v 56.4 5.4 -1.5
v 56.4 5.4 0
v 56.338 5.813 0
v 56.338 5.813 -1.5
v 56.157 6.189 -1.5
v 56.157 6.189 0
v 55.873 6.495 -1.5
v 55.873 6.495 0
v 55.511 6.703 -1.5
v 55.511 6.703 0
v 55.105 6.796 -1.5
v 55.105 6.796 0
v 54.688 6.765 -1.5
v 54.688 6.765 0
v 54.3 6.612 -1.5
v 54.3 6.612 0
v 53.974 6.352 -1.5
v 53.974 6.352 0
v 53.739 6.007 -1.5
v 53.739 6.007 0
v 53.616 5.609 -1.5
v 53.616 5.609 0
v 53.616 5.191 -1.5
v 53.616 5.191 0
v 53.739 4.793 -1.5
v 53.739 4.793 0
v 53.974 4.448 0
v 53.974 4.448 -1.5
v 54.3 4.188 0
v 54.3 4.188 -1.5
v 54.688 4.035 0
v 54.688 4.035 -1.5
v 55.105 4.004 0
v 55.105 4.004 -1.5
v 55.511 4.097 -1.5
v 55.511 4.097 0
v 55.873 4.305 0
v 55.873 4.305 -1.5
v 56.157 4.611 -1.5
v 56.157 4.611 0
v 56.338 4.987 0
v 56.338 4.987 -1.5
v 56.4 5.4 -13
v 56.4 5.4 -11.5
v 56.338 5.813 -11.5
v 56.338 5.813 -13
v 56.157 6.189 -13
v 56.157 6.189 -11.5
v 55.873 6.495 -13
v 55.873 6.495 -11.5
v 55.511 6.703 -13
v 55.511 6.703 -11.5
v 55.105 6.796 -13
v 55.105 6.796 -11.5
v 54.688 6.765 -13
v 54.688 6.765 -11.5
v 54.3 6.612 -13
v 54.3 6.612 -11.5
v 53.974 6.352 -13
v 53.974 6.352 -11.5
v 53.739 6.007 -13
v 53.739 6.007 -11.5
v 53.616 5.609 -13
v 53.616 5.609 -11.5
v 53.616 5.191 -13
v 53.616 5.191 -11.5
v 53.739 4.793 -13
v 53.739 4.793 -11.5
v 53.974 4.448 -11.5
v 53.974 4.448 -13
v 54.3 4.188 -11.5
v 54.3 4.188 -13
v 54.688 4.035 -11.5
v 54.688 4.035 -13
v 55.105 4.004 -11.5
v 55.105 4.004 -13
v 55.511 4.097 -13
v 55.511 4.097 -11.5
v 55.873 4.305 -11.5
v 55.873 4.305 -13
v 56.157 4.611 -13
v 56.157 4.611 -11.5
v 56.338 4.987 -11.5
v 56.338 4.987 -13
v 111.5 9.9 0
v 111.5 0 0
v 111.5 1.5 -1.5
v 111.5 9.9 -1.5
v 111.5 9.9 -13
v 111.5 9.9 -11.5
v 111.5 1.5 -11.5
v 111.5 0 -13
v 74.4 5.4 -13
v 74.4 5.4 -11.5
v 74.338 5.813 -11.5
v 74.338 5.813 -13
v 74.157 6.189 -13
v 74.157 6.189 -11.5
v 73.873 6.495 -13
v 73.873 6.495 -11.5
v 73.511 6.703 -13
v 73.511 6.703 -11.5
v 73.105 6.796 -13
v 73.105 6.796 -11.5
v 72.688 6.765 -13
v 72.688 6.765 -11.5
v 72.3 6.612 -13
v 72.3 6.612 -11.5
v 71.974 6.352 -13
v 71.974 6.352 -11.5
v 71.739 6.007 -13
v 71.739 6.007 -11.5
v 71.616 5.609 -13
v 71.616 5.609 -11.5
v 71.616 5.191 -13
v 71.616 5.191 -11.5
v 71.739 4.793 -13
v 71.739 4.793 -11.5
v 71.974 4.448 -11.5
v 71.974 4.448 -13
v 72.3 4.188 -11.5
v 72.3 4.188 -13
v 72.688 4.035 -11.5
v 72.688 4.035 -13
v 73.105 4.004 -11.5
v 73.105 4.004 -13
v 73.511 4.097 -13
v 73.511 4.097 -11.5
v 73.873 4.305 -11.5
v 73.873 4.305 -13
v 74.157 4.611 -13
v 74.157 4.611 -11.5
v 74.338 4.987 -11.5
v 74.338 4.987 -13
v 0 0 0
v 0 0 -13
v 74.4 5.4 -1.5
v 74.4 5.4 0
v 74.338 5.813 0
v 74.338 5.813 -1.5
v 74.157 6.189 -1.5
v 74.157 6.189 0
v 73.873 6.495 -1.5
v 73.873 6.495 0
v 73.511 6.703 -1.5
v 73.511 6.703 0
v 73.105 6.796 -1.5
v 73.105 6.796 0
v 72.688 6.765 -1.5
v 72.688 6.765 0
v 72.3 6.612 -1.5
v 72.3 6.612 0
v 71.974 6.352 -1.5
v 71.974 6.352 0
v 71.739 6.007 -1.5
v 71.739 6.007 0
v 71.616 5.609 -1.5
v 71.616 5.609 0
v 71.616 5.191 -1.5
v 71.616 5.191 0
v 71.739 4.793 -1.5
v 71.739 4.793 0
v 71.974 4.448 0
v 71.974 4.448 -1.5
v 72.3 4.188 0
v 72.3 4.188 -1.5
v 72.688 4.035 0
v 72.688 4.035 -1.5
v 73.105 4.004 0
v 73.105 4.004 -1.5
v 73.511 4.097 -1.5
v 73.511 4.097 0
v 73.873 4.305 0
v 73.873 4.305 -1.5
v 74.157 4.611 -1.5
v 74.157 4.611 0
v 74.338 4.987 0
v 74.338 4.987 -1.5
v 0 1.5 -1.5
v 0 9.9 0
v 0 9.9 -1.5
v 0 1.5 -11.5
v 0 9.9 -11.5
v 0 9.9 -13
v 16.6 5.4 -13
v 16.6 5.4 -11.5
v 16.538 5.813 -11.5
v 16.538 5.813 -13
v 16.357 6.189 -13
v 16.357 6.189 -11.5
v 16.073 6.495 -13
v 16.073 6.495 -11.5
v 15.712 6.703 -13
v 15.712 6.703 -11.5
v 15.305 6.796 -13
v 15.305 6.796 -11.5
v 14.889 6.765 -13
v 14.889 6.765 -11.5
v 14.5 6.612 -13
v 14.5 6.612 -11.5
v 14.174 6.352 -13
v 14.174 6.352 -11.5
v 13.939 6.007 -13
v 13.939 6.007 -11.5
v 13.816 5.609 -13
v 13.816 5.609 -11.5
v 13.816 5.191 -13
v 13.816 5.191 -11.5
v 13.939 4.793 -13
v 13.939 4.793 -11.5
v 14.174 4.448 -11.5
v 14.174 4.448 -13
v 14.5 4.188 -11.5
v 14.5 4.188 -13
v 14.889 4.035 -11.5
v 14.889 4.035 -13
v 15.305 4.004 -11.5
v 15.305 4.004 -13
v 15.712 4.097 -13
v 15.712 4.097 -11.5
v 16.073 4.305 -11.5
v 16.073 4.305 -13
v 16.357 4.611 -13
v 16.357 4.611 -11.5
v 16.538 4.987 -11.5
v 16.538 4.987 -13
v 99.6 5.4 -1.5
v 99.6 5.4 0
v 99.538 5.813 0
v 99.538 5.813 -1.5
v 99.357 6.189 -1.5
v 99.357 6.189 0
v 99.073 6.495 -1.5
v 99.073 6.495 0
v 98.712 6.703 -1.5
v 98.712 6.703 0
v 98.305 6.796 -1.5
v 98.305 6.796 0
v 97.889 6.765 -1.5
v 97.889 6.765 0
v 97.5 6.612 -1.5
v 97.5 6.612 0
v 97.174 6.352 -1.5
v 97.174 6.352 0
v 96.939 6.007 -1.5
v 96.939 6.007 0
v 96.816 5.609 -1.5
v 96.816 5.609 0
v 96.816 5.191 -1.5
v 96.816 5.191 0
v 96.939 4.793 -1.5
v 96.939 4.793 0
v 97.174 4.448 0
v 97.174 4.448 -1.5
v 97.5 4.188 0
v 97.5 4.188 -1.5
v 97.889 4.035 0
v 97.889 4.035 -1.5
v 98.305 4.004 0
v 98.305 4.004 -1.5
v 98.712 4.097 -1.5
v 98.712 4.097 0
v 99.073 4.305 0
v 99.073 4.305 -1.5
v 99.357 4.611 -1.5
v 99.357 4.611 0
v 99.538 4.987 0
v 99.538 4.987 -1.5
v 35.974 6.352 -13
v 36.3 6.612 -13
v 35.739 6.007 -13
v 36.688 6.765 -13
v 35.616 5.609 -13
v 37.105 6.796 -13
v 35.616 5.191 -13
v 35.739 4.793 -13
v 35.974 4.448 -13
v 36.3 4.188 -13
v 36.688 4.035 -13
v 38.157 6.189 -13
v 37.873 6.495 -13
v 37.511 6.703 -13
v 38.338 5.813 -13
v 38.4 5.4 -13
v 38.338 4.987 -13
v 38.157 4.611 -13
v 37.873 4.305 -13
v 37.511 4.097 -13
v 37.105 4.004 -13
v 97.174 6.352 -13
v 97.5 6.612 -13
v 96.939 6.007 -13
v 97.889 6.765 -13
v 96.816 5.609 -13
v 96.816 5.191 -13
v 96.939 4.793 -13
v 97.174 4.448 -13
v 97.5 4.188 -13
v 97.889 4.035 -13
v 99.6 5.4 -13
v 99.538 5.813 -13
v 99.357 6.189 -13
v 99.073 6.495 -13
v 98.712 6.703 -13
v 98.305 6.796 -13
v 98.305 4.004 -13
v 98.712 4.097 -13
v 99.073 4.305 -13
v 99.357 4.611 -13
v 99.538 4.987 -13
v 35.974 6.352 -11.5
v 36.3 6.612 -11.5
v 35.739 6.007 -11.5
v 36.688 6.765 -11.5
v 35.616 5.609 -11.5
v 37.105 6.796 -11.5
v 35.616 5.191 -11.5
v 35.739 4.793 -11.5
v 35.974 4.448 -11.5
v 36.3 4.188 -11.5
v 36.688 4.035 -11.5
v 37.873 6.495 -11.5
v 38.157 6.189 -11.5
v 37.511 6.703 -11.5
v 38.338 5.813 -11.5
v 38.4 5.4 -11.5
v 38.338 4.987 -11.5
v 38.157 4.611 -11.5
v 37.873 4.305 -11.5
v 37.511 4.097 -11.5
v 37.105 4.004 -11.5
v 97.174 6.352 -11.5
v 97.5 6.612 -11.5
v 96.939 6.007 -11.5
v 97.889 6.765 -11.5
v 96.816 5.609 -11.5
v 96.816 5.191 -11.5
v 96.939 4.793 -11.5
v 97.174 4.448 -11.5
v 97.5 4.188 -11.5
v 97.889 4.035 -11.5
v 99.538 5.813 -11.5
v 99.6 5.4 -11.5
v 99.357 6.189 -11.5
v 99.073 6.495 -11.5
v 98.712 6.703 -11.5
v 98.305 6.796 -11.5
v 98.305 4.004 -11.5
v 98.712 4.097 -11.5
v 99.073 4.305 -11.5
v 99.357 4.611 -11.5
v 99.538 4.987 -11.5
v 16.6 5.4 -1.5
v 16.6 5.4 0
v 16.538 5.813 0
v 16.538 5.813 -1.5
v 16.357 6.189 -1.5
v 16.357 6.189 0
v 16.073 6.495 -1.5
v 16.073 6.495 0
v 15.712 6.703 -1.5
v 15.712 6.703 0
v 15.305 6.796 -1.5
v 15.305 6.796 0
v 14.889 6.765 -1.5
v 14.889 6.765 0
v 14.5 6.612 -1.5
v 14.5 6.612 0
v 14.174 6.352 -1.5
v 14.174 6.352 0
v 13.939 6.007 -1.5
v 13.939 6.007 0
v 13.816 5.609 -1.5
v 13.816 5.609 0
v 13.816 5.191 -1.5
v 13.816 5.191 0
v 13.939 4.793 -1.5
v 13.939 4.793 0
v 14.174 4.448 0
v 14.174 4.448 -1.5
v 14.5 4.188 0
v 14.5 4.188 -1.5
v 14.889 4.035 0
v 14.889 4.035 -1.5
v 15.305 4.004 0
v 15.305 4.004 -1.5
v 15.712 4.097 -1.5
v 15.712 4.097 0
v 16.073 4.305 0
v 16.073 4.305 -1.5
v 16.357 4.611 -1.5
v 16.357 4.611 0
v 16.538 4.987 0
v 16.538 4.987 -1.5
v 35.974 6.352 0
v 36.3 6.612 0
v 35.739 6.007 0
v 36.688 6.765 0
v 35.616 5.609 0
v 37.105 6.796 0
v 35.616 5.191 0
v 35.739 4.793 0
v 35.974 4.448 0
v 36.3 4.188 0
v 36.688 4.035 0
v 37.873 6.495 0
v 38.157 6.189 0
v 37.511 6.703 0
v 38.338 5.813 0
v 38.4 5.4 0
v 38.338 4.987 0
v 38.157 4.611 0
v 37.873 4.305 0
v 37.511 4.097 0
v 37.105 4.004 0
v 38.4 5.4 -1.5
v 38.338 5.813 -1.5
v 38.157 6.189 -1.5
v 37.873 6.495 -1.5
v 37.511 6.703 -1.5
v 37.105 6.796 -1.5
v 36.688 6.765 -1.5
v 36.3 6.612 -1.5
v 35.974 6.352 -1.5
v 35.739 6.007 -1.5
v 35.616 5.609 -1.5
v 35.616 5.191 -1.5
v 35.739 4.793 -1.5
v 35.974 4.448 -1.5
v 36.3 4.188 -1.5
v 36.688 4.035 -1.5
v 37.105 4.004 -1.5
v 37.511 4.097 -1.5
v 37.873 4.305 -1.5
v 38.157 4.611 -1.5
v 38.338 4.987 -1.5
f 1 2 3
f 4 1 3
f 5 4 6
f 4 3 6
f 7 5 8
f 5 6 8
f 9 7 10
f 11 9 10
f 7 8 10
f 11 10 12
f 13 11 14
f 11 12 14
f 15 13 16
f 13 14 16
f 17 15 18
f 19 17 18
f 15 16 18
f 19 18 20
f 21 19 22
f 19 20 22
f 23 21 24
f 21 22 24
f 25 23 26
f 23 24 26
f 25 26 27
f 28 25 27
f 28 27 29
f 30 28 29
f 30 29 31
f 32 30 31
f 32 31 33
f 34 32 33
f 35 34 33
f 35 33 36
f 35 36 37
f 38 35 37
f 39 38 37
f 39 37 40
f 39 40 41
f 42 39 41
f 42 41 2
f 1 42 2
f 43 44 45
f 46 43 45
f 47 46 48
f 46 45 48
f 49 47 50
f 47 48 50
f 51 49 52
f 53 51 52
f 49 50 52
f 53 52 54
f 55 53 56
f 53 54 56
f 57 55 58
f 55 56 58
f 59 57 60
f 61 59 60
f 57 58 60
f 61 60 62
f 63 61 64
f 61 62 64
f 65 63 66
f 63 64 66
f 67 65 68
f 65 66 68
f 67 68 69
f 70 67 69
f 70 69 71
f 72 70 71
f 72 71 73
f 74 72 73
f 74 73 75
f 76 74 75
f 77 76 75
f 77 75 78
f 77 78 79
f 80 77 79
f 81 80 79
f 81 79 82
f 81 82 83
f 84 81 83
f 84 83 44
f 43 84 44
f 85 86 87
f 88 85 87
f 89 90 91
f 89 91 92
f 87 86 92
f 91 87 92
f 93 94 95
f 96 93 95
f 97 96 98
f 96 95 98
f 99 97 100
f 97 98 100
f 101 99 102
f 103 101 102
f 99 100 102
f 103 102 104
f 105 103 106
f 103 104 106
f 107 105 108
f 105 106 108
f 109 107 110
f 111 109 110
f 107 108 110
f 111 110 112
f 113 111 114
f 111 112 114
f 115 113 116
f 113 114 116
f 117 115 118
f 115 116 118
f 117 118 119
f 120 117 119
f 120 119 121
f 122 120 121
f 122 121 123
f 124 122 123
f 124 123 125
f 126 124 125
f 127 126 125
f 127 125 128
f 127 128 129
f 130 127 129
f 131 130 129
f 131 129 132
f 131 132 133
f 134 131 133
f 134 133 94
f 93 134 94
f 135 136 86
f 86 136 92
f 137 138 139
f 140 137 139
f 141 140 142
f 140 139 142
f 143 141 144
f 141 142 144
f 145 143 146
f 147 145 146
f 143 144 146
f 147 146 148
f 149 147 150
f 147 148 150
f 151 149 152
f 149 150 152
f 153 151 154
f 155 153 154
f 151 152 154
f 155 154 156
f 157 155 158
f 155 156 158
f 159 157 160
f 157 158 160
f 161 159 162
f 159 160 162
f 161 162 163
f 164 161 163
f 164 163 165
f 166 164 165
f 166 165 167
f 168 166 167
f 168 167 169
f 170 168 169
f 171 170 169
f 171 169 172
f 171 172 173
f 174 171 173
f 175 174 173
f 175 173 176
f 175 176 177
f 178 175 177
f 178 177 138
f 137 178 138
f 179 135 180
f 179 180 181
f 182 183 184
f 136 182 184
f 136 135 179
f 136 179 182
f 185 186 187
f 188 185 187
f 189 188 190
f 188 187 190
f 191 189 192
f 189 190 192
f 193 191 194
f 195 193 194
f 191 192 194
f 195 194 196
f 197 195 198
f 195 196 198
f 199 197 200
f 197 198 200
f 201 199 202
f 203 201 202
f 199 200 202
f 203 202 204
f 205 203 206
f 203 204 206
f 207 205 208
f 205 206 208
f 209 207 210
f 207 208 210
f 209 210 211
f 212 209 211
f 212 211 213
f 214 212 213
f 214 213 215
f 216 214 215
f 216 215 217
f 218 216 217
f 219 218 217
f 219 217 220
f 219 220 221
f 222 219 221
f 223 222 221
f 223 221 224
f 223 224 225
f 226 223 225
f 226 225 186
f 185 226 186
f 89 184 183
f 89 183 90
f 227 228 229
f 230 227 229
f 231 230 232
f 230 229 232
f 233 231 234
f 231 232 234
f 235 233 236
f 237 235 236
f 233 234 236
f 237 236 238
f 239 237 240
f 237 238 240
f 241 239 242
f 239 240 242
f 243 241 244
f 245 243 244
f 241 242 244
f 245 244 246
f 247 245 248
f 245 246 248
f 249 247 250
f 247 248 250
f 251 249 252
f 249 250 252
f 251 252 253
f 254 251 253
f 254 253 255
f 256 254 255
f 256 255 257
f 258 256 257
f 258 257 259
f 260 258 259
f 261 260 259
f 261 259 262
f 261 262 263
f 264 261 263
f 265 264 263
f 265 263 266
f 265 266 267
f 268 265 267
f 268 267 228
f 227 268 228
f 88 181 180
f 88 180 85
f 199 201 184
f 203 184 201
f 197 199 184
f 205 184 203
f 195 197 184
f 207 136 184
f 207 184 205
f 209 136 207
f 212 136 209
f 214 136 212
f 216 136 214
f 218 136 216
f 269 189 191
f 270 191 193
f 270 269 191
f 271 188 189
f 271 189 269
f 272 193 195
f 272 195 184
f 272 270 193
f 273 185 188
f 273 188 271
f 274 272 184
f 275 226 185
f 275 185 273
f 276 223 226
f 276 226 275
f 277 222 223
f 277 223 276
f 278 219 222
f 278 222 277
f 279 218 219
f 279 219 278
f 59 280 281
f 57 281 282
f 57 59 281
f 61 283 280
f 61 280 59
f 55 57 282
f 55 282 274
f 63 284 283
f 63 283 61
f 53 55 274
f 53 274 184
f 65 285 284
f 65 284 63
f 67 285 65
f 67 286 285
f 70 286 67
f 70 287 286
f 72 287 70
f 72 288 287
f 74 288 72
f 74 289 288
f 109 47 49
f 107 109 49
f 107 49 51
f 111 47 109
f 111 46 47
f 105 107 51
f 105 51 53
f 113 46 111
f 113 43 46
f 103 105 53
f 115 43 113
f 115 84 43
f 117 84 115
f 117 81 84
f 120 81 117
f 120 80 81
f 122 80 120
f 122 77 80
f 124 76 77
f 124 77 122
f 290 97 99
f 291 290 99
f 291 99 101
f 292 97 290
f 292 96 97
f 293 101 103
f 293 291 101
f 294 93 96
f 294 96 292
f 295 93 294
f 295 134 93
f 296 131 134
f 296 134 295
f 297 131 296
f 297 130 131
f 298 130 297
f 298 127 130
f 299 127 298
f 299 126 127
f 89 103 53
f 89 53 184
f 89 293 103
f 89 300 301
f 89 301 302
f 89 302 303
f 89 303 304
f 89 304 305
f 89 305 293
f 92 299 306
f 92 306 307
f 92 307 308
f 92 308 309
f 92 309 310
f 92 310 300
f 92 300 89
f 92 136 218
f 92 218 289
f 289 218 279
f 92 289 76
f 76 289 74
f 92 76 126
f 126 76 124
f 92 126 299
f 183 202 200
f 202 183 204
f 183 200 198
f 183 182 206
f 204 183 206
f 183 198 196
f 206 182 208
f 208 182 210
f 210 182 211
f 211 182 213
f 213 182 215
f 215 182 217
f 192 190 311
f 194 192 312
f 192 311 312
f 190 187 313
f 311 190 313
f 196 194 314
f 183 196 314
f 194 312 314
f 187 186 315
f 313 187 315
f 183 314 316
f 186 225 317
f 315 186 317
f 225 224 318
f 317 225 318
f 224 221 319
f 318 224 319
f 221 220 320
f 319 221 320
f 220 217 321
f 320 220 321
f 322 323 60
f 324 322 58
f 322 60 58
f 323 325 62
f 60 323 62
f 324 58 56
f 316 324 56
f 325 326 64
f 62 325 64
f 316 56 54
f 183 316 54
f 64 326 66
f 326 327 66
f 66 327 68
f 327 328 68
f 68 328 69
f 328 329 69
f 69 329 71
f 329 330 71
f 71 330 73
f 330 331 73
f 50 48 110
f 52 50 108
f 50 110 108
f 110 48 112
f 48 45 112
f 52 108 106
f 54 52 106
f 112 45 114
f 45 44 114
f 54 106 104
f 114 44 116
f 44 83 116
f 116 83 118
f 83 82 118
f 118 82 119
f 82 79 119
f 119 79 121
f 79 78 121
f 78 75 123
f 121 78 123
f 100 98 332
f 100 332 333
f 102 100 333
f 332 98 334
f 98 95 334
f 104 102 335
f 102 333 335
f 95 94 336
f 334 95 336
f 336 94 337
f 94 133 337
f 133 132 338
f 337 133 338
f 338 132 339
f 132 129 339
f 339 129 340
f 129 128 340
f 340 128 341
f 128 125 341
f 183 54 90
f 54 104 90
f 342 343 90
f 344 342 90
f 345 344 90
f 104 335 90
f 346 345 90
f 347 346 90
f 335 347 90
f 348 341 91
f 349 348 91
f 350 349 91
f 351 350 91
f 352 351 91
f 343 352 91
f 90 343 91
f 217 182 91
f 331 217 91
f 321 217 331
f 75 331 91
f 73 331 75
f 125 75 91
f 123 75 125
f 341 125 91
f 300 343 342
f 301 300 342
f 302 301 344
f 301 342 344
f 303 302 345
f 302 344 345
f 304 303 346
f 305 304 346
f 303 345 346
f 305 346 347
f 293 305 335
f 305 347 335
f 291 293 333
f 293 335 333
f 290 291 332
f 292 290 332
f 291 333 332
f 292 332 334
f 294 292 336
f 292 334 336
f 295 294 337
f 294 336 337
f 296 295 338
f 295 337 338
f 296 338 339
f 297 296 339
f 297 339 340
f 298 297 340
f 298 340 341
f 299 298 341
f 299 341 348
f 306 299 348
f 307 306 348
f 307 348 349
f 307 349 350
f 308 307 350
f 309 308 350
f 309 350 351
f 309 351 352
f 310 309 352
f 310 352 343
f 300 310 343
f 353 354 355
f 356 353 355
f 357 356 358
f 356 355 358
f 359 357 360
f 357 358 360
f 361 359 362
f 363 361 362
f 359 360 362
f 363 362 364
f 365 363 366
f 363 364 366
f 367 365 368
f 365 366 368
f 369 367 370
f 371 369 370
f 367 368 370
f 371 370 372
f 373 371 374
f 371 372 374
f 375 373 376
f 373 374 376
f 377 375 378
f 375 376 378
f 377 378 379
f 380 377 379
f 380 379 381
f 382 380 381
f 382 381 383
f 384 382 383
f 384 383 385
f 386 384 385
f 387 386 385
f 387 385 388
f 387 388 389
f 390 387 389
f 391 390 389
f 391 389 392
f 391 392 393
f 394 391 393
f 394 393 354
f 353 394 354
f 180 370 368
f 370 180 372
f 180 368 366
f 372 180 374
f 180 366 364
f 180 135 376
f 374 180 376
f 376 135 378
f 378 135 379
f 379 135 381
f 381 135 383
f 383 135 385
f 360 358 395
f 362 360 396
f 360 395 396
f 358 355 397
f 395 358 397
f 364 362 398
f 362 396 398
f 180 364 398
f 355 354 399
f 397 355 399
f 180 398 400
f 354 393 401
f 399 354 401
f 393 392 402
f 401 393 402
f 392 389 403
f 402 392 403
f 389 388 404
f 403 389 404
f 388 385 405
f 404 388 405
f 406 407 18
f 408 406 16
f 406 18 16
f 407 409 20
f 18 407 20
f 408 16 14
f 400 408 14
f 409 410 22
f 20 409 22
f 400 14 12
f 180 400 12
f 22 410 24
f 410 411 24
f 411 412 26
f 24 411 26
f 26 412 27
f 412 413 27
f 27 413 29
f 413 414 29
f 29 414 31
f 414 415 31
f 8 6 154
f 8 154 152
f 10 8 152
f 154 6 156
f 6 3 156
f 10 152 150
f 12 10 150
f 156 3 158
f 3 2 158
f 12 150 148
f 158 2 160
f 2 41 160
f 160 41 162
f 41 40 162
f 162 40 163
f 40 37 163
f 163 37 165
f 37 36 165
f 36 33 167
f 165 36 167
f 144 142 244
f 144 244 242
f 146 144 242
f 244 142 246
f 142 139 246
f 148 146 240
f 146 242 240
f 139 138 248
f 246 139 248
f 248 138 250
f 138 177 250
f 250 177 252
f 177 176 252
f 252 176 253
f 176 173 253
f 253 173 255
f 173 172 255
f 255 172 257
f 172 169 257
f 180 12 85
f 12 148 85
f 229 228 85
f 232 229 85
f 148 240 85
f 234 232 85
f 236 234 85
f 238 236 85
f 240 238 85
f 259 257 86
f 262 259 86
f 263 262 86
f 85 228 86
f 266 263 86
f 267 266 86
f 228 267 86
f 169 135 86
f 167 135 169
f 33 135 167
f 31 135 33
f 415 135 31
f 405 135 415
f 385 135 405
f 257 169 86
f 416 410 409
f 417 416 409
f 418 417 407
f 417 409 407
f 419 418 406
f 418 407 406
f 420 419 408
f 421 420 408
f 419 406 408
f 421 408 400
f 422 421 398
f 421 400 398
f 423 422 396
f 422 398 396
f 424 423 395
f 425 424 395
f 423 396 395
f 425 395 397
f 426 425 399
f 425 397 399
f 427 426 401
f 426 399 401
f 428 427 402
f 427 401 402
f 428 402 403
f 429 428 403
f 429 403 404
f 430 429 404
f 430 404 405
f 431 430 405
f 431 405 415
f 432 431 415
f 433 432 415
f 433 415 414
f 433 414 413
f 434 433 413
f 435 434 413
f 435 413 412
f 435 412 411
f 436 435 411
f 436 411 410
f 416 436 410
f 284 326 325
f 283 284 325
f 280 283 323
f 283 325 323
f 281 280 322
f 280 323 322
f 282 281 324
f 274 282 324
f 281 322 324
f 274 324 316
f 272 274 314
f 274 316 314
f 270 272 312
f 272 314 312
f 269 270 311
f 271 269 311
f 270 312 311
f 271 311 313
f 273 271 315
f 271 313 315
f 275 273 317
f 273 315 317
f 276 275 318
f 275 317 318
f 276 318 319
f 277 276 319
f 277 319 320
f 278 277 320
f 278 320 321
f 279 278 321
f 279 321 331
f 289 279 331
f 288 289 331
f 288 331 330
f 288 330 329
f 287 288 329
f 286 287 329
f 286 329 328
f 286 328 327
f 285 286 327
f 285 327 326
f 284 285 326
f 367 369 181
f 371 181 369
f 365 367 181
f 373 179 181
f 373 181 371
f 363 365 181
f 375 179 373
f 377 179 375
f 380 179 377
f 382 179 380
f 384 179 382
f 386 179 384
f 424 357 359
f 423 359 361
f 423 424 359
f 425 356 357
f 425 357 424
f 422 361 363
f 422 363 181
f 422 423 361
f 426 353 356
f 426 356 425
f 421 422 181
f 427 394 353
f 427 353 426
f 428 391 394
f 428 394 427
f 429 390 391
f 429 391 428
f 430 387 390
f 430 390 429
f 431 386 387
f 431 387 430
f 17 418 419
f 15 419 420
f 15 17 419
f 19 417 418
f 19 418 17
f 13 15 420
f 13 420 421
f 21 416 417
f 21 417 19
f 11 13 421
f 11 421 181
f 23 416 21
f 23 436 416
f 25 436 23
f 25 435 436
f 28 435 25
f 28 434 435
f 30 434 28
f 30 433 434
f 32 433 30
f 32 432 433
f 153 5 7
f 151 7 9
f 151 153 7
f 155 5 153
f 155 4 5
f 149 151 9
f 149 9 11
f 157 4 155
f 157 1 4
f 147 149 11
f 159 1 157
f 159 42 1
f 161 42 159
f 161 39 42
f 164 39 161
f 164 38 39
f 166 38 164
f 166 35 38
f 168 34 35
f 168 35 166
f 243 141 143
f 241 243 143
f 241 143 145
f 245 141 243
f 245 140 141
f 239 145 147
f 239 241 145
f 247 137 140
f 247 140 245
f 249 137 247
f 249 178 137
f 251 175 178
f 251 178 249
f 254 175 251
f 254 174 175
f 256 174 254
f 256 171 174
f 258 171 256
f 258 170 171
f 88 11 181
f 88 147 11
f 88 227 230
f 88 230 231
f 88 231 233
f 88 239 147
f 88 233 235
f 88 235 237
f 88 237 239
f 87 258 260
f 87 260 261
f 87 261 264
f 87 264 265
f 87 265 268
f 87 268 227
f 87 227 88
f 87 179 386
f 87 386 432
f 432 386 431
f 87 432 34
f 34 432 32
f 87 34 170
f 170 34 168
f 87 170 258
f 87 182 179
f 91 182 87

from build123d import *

# Parameters (mm, degrees)
ESQUISSE1_W             = 111.5
ESQUISSE1_H             = 13
BOSS_EXTRU_1_DEPTH      = 1.5
ESQUISSE2_W             = 111.5
ESQUISSE2_H             = 1.5
BOSS_EXTRU_2_DEPTH      = 8.4
ESQUISSE4_R             = 1.4
ENL_V_MAT_EXTRU_1_DEPTH = 20


with BuildPart() as part:
    # Esquisse1 → Boss.-Extru.1 (new body)
    with BuildSketch(Plane(origin=(0, 0, 0), x_dir=(1, 0, 0), z_dir=(0, 1, 0))):
        with Locations((55.75, 6.5)):
            Rectangle(ESQUISSE1_W, ESQUISSE1_H)
    extrude(amount=BOSS_EXTRU_1_DEPTH)

    # Esquisse2 → Boss.-Extru.2 (add)
    with BuildSketch(Plane(origin=(0, 1.5, 0), x_dir=(1, 0, 0), z_dir=(0, 1, 0))):
        with Locations((55.75, 12.25)):
            Rectangle(ESQUISSE2_W, ESQUISSE2_H)
        with Locations((55.75, 0.75)):
            Rectangle(ESQUISSE2_W, ESQUISSE2_H)
    extrude(amount=BOSS_EXTRU_2_DEPTH)

    # Esquisse4 → Enlèv. mat.-Extru.1 (cut)
    with BuildSketch(Plane.XY):
        with Locations((37, 5.4)):
            Circle(ESQUISSE4_R)
        with Locations((55, 5.4)):
            Circle(ESQUISSE4_R)
        with Locations((73, 5.4)):
            Circle(ESQUISSE4_R)
        with Locations((15.200278481, 5.4)):
            Circle(ESQUISSE4_R)
        with Locations((98.200278481, 5.4)):
            Circle(ESQUISSE4_R)
    extrude(amount=-ENL_V_MAT_EXTRU_1_DEPTH, mode=Mode.SUBTRACT)


solid = part.part
